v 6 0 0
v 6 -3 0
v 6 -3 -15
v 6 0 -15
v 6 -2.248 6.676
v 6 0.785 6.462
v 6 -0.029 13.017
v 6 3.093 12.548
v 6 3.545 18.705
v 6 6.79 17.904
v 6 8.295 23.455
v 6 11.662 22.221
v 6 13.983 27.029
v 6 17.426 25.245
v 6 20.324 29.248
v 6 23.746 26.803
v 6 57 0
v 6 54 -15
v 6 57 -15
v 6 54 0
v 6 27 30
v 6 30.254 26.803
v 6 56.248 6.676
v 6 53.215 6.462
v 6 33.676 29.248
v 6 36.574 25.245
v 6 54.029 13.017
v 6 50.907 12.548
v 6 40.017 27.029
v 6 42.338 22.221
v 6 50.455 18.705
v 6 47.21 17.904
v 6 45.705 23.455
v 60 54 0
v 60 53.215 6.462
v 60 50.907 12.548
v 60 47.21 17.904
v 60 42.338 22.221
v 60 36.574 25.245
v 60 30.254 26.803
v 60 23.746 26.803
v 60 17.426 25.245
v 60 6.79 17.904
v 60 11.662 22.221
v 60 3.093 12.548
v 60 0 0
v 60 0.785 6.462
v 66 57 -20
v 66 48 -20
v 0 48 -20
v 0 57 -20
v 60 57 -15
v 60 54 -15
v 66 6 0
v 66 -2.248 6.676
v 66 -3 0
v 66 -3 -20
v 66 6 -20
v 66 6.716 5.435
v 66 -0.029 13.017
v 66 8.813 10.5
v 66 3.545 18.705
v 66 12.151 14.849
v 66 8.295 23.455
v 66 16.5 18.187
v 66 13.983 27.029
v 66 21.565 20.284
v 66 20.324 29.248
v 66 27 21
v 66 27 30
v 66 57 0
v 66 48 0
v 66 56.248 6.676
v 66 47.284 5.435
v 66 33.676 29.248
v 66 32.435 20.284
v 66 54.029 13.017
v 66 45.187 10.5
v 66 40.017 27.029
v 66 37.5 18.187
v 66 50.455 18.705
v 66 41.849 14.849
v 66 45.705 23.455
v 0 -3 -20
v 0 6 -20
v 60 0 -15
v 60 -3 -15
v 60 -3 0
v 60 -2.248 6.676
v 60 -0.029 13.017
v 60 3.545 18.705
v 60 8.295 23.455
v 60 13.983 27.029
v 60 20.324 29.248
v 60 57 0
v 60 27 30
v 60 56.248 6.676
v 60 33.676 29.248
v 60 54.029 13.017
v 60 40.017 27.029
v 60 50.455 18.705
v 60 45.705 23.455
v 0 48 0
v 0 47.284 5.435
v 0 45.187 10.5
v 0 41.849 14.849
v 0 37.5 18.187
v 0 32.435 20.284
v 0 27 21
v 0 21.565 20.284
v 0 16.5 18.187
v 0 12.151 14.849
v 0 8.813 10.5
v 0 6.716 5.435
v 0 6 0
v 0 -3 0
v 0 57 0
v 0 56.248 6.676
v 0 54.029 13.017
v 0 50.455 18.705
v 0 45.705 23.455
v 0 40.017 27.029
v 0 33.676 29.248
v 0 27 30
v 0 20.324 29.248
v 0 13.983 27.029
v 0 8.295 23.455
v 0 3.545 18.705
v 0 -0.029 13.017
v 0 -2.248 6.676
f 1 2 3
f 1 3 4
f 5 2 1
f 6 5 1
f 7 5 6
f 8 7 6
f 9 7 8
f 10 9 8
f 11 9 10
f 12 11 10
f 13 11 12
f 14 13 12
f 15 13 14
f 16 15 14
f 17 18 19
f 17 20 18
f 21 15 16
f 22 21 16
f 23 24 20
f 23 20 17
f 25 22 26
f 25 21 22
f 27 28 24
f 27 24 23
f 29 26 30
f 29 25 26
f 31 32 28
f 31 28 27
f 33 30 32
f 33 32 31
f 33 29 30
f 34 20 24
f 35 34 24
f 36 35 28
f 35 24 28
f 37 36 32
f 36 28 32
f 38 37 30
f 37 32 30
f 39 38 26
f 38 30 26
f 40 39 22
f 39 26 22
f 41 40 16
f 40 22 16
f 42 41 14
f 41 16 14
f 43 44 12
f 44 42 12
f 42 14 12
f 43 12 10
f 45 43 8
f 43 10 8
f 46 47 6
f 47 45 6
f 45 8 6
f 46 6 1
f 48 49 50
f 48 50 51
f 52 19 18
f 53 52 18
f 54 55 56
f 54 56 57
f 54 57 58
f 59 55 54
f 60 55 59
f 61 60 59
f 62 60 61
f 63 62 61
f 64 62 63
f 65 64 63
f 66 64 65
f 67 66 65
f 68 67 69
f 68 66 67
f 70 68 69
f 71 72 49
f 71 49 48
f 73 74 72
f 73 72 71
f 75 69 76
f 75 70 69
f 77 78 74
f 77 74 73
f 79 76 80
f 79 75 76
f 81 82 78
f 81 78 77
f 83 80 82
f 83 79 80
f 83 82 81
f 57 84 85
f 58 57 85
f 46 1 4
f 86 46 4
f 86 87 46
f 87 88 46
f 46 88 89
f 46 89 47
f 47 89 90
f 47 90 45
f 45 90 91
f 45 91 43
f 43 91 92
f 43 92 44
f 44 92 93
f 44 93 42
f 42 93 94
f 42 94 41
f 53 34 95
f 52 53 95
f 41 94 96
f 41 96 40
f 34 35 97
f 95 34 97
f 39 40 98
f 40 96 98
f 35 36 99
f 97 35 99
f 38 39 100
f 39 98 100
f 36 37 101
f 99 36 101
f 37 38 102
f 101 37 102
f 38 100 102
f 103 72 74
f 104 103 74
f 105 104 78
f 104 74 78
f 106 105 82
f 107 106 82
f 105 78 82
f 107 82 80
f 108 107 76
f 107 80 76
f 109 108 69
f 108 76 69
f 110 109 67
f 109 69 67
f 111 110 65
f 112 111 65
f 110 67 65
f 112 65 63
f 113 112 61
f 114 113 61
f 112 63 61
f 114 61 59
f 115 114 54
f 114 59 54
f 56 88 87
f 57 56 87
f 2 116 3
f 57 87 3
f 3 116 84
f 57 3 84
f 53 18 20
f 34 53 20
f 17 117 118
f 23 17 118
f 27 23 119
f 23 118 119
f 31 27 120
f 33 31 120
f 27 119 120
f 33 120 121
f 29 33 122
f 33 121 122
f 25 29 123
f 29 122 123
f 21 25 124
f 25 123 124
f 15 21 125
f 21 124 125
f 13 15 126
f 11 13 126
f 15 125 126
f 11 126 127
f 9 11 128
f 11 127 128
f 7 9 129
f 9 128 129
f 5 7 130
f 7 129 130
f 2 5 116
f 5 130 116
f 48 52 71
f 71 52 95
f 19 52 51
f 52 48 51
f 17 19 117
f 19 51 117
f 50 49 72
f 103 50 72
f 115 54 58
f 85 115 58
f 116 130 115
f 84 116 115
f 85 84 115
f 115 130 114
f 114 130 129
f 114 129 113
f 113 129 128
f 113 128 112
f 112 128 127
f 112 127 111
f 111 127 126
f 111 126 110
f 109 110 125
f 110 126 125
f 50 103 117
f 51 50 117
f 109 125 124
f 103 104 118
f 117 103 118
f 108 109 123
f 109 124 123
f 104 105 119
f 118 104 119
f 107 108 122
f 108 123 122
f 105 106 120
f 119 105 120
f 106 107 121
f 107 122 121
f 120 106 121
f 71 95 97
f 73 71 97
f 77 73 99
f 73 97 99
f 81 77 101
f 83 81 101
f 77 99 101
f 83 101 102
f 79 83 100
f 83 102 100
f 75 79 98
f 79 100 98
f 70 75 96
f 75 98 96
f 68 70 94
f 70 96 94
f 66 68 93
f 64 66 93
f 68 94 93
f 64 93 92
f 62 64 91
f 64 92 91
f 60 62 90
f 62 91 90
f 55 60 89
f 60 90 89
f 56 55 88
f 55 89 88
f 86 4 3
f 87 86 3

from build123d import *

# Parameters (mm, degrees)
BOSS_EXTRUDE1_DEPTH = 66
CUT_EXTRUDE1_DEPTH  = 92.290744328
BOSS_EXTRUDE2_START = -6
BOSS_EXTRUDE2_DEPTH = 6
BOSS_EXTRUDE3_DEPTH = 6


with BuildPart() as part:
    # Sketch1 → Boss-Extrude1 (new body)
    with BuildSketch(Plane.YZ):
        with BuildLine():
            Line((0, 0), (0, -15))
            Line((0, -15), (-3, -15))
            Line((-3, -15), (-3, -20))
            Line((-3, -20), (0, -20))
            Line((0, -20), (54, -20))
            Line((54, -20), (57, -20))
            Line((57, -20), (57, -15))
            Line((57, -15), (54, -15))
            Line((54, -15), (54, 0))
            ThreePointArc((54, 0), (27, 27), (0, 0))
        make_face()
    extrude(amount=BOSS_EXTRUDE1_DEPTH)

    # Sketch2 → Cut-Extrude1 (cut, through all)
    with BuildSketch(Plane.YZ.offset(66)):
        with BuildLine():
            Line((6, 0), (6, -20))
            Line((6, -20), (48, -20))
            Line((48, -20), (48, 0))
            ThreePointArc((48, 0), (27, 21), (6, 0))
        make_face()
    extrude(amount=-CUT_EXTRUDE1_DEPTH, mode=Mode.SUBTRACT)

    # Sketch3 → Boss-Extrude2 (add)
    with BuildSketch(Plane.YZ.offset(66).offset(BOSS_EXTRUDE2_START)):
        with BuildLine():
            Line((-3, -15), (0, -15))
            Line((0, -15), (0, 0))
            ThreePointArc((0, 0), (27, 27), (54, 0))
            Line((54, 0), (54, -15))
            Line((54, -15), (57, -15))
            Line((57, -15), (57, 0))
            ThreePointArc((57, 0), (27, 30), (-3, 0))
            Line((-3, 0), (-3, -15))
        make_face()
    extrude(amount=BOSS_EXTRUDE2_DEPTH)

    # Sketch4 → Boss-Extrude3 (add)
    with BuildSketch(Plane(origin=(0, 0, 0), x_dir=(0, -1, 0), z_dir=(-1, 0, 0))):
        with BuildLine():
            Line((-54, -15), (-57, -15))
            Line((-57, -15), (-57, 0))
            ThreePointArc((-57, 0), (-27, 30), (3, 0))
            Line((3, 0), (3, -15))
            Line((3, -15), (0, -15))
            Line((0, -15), (0, 0))
            ThreePointArc((0, 0), (-27, 27), (-54, 0))
            Line((-54, 0), (-54, -15))
        make_face()
    extrude(amount=-BOSS_EXTRUDE3_DEPTH)


solid = part.part
